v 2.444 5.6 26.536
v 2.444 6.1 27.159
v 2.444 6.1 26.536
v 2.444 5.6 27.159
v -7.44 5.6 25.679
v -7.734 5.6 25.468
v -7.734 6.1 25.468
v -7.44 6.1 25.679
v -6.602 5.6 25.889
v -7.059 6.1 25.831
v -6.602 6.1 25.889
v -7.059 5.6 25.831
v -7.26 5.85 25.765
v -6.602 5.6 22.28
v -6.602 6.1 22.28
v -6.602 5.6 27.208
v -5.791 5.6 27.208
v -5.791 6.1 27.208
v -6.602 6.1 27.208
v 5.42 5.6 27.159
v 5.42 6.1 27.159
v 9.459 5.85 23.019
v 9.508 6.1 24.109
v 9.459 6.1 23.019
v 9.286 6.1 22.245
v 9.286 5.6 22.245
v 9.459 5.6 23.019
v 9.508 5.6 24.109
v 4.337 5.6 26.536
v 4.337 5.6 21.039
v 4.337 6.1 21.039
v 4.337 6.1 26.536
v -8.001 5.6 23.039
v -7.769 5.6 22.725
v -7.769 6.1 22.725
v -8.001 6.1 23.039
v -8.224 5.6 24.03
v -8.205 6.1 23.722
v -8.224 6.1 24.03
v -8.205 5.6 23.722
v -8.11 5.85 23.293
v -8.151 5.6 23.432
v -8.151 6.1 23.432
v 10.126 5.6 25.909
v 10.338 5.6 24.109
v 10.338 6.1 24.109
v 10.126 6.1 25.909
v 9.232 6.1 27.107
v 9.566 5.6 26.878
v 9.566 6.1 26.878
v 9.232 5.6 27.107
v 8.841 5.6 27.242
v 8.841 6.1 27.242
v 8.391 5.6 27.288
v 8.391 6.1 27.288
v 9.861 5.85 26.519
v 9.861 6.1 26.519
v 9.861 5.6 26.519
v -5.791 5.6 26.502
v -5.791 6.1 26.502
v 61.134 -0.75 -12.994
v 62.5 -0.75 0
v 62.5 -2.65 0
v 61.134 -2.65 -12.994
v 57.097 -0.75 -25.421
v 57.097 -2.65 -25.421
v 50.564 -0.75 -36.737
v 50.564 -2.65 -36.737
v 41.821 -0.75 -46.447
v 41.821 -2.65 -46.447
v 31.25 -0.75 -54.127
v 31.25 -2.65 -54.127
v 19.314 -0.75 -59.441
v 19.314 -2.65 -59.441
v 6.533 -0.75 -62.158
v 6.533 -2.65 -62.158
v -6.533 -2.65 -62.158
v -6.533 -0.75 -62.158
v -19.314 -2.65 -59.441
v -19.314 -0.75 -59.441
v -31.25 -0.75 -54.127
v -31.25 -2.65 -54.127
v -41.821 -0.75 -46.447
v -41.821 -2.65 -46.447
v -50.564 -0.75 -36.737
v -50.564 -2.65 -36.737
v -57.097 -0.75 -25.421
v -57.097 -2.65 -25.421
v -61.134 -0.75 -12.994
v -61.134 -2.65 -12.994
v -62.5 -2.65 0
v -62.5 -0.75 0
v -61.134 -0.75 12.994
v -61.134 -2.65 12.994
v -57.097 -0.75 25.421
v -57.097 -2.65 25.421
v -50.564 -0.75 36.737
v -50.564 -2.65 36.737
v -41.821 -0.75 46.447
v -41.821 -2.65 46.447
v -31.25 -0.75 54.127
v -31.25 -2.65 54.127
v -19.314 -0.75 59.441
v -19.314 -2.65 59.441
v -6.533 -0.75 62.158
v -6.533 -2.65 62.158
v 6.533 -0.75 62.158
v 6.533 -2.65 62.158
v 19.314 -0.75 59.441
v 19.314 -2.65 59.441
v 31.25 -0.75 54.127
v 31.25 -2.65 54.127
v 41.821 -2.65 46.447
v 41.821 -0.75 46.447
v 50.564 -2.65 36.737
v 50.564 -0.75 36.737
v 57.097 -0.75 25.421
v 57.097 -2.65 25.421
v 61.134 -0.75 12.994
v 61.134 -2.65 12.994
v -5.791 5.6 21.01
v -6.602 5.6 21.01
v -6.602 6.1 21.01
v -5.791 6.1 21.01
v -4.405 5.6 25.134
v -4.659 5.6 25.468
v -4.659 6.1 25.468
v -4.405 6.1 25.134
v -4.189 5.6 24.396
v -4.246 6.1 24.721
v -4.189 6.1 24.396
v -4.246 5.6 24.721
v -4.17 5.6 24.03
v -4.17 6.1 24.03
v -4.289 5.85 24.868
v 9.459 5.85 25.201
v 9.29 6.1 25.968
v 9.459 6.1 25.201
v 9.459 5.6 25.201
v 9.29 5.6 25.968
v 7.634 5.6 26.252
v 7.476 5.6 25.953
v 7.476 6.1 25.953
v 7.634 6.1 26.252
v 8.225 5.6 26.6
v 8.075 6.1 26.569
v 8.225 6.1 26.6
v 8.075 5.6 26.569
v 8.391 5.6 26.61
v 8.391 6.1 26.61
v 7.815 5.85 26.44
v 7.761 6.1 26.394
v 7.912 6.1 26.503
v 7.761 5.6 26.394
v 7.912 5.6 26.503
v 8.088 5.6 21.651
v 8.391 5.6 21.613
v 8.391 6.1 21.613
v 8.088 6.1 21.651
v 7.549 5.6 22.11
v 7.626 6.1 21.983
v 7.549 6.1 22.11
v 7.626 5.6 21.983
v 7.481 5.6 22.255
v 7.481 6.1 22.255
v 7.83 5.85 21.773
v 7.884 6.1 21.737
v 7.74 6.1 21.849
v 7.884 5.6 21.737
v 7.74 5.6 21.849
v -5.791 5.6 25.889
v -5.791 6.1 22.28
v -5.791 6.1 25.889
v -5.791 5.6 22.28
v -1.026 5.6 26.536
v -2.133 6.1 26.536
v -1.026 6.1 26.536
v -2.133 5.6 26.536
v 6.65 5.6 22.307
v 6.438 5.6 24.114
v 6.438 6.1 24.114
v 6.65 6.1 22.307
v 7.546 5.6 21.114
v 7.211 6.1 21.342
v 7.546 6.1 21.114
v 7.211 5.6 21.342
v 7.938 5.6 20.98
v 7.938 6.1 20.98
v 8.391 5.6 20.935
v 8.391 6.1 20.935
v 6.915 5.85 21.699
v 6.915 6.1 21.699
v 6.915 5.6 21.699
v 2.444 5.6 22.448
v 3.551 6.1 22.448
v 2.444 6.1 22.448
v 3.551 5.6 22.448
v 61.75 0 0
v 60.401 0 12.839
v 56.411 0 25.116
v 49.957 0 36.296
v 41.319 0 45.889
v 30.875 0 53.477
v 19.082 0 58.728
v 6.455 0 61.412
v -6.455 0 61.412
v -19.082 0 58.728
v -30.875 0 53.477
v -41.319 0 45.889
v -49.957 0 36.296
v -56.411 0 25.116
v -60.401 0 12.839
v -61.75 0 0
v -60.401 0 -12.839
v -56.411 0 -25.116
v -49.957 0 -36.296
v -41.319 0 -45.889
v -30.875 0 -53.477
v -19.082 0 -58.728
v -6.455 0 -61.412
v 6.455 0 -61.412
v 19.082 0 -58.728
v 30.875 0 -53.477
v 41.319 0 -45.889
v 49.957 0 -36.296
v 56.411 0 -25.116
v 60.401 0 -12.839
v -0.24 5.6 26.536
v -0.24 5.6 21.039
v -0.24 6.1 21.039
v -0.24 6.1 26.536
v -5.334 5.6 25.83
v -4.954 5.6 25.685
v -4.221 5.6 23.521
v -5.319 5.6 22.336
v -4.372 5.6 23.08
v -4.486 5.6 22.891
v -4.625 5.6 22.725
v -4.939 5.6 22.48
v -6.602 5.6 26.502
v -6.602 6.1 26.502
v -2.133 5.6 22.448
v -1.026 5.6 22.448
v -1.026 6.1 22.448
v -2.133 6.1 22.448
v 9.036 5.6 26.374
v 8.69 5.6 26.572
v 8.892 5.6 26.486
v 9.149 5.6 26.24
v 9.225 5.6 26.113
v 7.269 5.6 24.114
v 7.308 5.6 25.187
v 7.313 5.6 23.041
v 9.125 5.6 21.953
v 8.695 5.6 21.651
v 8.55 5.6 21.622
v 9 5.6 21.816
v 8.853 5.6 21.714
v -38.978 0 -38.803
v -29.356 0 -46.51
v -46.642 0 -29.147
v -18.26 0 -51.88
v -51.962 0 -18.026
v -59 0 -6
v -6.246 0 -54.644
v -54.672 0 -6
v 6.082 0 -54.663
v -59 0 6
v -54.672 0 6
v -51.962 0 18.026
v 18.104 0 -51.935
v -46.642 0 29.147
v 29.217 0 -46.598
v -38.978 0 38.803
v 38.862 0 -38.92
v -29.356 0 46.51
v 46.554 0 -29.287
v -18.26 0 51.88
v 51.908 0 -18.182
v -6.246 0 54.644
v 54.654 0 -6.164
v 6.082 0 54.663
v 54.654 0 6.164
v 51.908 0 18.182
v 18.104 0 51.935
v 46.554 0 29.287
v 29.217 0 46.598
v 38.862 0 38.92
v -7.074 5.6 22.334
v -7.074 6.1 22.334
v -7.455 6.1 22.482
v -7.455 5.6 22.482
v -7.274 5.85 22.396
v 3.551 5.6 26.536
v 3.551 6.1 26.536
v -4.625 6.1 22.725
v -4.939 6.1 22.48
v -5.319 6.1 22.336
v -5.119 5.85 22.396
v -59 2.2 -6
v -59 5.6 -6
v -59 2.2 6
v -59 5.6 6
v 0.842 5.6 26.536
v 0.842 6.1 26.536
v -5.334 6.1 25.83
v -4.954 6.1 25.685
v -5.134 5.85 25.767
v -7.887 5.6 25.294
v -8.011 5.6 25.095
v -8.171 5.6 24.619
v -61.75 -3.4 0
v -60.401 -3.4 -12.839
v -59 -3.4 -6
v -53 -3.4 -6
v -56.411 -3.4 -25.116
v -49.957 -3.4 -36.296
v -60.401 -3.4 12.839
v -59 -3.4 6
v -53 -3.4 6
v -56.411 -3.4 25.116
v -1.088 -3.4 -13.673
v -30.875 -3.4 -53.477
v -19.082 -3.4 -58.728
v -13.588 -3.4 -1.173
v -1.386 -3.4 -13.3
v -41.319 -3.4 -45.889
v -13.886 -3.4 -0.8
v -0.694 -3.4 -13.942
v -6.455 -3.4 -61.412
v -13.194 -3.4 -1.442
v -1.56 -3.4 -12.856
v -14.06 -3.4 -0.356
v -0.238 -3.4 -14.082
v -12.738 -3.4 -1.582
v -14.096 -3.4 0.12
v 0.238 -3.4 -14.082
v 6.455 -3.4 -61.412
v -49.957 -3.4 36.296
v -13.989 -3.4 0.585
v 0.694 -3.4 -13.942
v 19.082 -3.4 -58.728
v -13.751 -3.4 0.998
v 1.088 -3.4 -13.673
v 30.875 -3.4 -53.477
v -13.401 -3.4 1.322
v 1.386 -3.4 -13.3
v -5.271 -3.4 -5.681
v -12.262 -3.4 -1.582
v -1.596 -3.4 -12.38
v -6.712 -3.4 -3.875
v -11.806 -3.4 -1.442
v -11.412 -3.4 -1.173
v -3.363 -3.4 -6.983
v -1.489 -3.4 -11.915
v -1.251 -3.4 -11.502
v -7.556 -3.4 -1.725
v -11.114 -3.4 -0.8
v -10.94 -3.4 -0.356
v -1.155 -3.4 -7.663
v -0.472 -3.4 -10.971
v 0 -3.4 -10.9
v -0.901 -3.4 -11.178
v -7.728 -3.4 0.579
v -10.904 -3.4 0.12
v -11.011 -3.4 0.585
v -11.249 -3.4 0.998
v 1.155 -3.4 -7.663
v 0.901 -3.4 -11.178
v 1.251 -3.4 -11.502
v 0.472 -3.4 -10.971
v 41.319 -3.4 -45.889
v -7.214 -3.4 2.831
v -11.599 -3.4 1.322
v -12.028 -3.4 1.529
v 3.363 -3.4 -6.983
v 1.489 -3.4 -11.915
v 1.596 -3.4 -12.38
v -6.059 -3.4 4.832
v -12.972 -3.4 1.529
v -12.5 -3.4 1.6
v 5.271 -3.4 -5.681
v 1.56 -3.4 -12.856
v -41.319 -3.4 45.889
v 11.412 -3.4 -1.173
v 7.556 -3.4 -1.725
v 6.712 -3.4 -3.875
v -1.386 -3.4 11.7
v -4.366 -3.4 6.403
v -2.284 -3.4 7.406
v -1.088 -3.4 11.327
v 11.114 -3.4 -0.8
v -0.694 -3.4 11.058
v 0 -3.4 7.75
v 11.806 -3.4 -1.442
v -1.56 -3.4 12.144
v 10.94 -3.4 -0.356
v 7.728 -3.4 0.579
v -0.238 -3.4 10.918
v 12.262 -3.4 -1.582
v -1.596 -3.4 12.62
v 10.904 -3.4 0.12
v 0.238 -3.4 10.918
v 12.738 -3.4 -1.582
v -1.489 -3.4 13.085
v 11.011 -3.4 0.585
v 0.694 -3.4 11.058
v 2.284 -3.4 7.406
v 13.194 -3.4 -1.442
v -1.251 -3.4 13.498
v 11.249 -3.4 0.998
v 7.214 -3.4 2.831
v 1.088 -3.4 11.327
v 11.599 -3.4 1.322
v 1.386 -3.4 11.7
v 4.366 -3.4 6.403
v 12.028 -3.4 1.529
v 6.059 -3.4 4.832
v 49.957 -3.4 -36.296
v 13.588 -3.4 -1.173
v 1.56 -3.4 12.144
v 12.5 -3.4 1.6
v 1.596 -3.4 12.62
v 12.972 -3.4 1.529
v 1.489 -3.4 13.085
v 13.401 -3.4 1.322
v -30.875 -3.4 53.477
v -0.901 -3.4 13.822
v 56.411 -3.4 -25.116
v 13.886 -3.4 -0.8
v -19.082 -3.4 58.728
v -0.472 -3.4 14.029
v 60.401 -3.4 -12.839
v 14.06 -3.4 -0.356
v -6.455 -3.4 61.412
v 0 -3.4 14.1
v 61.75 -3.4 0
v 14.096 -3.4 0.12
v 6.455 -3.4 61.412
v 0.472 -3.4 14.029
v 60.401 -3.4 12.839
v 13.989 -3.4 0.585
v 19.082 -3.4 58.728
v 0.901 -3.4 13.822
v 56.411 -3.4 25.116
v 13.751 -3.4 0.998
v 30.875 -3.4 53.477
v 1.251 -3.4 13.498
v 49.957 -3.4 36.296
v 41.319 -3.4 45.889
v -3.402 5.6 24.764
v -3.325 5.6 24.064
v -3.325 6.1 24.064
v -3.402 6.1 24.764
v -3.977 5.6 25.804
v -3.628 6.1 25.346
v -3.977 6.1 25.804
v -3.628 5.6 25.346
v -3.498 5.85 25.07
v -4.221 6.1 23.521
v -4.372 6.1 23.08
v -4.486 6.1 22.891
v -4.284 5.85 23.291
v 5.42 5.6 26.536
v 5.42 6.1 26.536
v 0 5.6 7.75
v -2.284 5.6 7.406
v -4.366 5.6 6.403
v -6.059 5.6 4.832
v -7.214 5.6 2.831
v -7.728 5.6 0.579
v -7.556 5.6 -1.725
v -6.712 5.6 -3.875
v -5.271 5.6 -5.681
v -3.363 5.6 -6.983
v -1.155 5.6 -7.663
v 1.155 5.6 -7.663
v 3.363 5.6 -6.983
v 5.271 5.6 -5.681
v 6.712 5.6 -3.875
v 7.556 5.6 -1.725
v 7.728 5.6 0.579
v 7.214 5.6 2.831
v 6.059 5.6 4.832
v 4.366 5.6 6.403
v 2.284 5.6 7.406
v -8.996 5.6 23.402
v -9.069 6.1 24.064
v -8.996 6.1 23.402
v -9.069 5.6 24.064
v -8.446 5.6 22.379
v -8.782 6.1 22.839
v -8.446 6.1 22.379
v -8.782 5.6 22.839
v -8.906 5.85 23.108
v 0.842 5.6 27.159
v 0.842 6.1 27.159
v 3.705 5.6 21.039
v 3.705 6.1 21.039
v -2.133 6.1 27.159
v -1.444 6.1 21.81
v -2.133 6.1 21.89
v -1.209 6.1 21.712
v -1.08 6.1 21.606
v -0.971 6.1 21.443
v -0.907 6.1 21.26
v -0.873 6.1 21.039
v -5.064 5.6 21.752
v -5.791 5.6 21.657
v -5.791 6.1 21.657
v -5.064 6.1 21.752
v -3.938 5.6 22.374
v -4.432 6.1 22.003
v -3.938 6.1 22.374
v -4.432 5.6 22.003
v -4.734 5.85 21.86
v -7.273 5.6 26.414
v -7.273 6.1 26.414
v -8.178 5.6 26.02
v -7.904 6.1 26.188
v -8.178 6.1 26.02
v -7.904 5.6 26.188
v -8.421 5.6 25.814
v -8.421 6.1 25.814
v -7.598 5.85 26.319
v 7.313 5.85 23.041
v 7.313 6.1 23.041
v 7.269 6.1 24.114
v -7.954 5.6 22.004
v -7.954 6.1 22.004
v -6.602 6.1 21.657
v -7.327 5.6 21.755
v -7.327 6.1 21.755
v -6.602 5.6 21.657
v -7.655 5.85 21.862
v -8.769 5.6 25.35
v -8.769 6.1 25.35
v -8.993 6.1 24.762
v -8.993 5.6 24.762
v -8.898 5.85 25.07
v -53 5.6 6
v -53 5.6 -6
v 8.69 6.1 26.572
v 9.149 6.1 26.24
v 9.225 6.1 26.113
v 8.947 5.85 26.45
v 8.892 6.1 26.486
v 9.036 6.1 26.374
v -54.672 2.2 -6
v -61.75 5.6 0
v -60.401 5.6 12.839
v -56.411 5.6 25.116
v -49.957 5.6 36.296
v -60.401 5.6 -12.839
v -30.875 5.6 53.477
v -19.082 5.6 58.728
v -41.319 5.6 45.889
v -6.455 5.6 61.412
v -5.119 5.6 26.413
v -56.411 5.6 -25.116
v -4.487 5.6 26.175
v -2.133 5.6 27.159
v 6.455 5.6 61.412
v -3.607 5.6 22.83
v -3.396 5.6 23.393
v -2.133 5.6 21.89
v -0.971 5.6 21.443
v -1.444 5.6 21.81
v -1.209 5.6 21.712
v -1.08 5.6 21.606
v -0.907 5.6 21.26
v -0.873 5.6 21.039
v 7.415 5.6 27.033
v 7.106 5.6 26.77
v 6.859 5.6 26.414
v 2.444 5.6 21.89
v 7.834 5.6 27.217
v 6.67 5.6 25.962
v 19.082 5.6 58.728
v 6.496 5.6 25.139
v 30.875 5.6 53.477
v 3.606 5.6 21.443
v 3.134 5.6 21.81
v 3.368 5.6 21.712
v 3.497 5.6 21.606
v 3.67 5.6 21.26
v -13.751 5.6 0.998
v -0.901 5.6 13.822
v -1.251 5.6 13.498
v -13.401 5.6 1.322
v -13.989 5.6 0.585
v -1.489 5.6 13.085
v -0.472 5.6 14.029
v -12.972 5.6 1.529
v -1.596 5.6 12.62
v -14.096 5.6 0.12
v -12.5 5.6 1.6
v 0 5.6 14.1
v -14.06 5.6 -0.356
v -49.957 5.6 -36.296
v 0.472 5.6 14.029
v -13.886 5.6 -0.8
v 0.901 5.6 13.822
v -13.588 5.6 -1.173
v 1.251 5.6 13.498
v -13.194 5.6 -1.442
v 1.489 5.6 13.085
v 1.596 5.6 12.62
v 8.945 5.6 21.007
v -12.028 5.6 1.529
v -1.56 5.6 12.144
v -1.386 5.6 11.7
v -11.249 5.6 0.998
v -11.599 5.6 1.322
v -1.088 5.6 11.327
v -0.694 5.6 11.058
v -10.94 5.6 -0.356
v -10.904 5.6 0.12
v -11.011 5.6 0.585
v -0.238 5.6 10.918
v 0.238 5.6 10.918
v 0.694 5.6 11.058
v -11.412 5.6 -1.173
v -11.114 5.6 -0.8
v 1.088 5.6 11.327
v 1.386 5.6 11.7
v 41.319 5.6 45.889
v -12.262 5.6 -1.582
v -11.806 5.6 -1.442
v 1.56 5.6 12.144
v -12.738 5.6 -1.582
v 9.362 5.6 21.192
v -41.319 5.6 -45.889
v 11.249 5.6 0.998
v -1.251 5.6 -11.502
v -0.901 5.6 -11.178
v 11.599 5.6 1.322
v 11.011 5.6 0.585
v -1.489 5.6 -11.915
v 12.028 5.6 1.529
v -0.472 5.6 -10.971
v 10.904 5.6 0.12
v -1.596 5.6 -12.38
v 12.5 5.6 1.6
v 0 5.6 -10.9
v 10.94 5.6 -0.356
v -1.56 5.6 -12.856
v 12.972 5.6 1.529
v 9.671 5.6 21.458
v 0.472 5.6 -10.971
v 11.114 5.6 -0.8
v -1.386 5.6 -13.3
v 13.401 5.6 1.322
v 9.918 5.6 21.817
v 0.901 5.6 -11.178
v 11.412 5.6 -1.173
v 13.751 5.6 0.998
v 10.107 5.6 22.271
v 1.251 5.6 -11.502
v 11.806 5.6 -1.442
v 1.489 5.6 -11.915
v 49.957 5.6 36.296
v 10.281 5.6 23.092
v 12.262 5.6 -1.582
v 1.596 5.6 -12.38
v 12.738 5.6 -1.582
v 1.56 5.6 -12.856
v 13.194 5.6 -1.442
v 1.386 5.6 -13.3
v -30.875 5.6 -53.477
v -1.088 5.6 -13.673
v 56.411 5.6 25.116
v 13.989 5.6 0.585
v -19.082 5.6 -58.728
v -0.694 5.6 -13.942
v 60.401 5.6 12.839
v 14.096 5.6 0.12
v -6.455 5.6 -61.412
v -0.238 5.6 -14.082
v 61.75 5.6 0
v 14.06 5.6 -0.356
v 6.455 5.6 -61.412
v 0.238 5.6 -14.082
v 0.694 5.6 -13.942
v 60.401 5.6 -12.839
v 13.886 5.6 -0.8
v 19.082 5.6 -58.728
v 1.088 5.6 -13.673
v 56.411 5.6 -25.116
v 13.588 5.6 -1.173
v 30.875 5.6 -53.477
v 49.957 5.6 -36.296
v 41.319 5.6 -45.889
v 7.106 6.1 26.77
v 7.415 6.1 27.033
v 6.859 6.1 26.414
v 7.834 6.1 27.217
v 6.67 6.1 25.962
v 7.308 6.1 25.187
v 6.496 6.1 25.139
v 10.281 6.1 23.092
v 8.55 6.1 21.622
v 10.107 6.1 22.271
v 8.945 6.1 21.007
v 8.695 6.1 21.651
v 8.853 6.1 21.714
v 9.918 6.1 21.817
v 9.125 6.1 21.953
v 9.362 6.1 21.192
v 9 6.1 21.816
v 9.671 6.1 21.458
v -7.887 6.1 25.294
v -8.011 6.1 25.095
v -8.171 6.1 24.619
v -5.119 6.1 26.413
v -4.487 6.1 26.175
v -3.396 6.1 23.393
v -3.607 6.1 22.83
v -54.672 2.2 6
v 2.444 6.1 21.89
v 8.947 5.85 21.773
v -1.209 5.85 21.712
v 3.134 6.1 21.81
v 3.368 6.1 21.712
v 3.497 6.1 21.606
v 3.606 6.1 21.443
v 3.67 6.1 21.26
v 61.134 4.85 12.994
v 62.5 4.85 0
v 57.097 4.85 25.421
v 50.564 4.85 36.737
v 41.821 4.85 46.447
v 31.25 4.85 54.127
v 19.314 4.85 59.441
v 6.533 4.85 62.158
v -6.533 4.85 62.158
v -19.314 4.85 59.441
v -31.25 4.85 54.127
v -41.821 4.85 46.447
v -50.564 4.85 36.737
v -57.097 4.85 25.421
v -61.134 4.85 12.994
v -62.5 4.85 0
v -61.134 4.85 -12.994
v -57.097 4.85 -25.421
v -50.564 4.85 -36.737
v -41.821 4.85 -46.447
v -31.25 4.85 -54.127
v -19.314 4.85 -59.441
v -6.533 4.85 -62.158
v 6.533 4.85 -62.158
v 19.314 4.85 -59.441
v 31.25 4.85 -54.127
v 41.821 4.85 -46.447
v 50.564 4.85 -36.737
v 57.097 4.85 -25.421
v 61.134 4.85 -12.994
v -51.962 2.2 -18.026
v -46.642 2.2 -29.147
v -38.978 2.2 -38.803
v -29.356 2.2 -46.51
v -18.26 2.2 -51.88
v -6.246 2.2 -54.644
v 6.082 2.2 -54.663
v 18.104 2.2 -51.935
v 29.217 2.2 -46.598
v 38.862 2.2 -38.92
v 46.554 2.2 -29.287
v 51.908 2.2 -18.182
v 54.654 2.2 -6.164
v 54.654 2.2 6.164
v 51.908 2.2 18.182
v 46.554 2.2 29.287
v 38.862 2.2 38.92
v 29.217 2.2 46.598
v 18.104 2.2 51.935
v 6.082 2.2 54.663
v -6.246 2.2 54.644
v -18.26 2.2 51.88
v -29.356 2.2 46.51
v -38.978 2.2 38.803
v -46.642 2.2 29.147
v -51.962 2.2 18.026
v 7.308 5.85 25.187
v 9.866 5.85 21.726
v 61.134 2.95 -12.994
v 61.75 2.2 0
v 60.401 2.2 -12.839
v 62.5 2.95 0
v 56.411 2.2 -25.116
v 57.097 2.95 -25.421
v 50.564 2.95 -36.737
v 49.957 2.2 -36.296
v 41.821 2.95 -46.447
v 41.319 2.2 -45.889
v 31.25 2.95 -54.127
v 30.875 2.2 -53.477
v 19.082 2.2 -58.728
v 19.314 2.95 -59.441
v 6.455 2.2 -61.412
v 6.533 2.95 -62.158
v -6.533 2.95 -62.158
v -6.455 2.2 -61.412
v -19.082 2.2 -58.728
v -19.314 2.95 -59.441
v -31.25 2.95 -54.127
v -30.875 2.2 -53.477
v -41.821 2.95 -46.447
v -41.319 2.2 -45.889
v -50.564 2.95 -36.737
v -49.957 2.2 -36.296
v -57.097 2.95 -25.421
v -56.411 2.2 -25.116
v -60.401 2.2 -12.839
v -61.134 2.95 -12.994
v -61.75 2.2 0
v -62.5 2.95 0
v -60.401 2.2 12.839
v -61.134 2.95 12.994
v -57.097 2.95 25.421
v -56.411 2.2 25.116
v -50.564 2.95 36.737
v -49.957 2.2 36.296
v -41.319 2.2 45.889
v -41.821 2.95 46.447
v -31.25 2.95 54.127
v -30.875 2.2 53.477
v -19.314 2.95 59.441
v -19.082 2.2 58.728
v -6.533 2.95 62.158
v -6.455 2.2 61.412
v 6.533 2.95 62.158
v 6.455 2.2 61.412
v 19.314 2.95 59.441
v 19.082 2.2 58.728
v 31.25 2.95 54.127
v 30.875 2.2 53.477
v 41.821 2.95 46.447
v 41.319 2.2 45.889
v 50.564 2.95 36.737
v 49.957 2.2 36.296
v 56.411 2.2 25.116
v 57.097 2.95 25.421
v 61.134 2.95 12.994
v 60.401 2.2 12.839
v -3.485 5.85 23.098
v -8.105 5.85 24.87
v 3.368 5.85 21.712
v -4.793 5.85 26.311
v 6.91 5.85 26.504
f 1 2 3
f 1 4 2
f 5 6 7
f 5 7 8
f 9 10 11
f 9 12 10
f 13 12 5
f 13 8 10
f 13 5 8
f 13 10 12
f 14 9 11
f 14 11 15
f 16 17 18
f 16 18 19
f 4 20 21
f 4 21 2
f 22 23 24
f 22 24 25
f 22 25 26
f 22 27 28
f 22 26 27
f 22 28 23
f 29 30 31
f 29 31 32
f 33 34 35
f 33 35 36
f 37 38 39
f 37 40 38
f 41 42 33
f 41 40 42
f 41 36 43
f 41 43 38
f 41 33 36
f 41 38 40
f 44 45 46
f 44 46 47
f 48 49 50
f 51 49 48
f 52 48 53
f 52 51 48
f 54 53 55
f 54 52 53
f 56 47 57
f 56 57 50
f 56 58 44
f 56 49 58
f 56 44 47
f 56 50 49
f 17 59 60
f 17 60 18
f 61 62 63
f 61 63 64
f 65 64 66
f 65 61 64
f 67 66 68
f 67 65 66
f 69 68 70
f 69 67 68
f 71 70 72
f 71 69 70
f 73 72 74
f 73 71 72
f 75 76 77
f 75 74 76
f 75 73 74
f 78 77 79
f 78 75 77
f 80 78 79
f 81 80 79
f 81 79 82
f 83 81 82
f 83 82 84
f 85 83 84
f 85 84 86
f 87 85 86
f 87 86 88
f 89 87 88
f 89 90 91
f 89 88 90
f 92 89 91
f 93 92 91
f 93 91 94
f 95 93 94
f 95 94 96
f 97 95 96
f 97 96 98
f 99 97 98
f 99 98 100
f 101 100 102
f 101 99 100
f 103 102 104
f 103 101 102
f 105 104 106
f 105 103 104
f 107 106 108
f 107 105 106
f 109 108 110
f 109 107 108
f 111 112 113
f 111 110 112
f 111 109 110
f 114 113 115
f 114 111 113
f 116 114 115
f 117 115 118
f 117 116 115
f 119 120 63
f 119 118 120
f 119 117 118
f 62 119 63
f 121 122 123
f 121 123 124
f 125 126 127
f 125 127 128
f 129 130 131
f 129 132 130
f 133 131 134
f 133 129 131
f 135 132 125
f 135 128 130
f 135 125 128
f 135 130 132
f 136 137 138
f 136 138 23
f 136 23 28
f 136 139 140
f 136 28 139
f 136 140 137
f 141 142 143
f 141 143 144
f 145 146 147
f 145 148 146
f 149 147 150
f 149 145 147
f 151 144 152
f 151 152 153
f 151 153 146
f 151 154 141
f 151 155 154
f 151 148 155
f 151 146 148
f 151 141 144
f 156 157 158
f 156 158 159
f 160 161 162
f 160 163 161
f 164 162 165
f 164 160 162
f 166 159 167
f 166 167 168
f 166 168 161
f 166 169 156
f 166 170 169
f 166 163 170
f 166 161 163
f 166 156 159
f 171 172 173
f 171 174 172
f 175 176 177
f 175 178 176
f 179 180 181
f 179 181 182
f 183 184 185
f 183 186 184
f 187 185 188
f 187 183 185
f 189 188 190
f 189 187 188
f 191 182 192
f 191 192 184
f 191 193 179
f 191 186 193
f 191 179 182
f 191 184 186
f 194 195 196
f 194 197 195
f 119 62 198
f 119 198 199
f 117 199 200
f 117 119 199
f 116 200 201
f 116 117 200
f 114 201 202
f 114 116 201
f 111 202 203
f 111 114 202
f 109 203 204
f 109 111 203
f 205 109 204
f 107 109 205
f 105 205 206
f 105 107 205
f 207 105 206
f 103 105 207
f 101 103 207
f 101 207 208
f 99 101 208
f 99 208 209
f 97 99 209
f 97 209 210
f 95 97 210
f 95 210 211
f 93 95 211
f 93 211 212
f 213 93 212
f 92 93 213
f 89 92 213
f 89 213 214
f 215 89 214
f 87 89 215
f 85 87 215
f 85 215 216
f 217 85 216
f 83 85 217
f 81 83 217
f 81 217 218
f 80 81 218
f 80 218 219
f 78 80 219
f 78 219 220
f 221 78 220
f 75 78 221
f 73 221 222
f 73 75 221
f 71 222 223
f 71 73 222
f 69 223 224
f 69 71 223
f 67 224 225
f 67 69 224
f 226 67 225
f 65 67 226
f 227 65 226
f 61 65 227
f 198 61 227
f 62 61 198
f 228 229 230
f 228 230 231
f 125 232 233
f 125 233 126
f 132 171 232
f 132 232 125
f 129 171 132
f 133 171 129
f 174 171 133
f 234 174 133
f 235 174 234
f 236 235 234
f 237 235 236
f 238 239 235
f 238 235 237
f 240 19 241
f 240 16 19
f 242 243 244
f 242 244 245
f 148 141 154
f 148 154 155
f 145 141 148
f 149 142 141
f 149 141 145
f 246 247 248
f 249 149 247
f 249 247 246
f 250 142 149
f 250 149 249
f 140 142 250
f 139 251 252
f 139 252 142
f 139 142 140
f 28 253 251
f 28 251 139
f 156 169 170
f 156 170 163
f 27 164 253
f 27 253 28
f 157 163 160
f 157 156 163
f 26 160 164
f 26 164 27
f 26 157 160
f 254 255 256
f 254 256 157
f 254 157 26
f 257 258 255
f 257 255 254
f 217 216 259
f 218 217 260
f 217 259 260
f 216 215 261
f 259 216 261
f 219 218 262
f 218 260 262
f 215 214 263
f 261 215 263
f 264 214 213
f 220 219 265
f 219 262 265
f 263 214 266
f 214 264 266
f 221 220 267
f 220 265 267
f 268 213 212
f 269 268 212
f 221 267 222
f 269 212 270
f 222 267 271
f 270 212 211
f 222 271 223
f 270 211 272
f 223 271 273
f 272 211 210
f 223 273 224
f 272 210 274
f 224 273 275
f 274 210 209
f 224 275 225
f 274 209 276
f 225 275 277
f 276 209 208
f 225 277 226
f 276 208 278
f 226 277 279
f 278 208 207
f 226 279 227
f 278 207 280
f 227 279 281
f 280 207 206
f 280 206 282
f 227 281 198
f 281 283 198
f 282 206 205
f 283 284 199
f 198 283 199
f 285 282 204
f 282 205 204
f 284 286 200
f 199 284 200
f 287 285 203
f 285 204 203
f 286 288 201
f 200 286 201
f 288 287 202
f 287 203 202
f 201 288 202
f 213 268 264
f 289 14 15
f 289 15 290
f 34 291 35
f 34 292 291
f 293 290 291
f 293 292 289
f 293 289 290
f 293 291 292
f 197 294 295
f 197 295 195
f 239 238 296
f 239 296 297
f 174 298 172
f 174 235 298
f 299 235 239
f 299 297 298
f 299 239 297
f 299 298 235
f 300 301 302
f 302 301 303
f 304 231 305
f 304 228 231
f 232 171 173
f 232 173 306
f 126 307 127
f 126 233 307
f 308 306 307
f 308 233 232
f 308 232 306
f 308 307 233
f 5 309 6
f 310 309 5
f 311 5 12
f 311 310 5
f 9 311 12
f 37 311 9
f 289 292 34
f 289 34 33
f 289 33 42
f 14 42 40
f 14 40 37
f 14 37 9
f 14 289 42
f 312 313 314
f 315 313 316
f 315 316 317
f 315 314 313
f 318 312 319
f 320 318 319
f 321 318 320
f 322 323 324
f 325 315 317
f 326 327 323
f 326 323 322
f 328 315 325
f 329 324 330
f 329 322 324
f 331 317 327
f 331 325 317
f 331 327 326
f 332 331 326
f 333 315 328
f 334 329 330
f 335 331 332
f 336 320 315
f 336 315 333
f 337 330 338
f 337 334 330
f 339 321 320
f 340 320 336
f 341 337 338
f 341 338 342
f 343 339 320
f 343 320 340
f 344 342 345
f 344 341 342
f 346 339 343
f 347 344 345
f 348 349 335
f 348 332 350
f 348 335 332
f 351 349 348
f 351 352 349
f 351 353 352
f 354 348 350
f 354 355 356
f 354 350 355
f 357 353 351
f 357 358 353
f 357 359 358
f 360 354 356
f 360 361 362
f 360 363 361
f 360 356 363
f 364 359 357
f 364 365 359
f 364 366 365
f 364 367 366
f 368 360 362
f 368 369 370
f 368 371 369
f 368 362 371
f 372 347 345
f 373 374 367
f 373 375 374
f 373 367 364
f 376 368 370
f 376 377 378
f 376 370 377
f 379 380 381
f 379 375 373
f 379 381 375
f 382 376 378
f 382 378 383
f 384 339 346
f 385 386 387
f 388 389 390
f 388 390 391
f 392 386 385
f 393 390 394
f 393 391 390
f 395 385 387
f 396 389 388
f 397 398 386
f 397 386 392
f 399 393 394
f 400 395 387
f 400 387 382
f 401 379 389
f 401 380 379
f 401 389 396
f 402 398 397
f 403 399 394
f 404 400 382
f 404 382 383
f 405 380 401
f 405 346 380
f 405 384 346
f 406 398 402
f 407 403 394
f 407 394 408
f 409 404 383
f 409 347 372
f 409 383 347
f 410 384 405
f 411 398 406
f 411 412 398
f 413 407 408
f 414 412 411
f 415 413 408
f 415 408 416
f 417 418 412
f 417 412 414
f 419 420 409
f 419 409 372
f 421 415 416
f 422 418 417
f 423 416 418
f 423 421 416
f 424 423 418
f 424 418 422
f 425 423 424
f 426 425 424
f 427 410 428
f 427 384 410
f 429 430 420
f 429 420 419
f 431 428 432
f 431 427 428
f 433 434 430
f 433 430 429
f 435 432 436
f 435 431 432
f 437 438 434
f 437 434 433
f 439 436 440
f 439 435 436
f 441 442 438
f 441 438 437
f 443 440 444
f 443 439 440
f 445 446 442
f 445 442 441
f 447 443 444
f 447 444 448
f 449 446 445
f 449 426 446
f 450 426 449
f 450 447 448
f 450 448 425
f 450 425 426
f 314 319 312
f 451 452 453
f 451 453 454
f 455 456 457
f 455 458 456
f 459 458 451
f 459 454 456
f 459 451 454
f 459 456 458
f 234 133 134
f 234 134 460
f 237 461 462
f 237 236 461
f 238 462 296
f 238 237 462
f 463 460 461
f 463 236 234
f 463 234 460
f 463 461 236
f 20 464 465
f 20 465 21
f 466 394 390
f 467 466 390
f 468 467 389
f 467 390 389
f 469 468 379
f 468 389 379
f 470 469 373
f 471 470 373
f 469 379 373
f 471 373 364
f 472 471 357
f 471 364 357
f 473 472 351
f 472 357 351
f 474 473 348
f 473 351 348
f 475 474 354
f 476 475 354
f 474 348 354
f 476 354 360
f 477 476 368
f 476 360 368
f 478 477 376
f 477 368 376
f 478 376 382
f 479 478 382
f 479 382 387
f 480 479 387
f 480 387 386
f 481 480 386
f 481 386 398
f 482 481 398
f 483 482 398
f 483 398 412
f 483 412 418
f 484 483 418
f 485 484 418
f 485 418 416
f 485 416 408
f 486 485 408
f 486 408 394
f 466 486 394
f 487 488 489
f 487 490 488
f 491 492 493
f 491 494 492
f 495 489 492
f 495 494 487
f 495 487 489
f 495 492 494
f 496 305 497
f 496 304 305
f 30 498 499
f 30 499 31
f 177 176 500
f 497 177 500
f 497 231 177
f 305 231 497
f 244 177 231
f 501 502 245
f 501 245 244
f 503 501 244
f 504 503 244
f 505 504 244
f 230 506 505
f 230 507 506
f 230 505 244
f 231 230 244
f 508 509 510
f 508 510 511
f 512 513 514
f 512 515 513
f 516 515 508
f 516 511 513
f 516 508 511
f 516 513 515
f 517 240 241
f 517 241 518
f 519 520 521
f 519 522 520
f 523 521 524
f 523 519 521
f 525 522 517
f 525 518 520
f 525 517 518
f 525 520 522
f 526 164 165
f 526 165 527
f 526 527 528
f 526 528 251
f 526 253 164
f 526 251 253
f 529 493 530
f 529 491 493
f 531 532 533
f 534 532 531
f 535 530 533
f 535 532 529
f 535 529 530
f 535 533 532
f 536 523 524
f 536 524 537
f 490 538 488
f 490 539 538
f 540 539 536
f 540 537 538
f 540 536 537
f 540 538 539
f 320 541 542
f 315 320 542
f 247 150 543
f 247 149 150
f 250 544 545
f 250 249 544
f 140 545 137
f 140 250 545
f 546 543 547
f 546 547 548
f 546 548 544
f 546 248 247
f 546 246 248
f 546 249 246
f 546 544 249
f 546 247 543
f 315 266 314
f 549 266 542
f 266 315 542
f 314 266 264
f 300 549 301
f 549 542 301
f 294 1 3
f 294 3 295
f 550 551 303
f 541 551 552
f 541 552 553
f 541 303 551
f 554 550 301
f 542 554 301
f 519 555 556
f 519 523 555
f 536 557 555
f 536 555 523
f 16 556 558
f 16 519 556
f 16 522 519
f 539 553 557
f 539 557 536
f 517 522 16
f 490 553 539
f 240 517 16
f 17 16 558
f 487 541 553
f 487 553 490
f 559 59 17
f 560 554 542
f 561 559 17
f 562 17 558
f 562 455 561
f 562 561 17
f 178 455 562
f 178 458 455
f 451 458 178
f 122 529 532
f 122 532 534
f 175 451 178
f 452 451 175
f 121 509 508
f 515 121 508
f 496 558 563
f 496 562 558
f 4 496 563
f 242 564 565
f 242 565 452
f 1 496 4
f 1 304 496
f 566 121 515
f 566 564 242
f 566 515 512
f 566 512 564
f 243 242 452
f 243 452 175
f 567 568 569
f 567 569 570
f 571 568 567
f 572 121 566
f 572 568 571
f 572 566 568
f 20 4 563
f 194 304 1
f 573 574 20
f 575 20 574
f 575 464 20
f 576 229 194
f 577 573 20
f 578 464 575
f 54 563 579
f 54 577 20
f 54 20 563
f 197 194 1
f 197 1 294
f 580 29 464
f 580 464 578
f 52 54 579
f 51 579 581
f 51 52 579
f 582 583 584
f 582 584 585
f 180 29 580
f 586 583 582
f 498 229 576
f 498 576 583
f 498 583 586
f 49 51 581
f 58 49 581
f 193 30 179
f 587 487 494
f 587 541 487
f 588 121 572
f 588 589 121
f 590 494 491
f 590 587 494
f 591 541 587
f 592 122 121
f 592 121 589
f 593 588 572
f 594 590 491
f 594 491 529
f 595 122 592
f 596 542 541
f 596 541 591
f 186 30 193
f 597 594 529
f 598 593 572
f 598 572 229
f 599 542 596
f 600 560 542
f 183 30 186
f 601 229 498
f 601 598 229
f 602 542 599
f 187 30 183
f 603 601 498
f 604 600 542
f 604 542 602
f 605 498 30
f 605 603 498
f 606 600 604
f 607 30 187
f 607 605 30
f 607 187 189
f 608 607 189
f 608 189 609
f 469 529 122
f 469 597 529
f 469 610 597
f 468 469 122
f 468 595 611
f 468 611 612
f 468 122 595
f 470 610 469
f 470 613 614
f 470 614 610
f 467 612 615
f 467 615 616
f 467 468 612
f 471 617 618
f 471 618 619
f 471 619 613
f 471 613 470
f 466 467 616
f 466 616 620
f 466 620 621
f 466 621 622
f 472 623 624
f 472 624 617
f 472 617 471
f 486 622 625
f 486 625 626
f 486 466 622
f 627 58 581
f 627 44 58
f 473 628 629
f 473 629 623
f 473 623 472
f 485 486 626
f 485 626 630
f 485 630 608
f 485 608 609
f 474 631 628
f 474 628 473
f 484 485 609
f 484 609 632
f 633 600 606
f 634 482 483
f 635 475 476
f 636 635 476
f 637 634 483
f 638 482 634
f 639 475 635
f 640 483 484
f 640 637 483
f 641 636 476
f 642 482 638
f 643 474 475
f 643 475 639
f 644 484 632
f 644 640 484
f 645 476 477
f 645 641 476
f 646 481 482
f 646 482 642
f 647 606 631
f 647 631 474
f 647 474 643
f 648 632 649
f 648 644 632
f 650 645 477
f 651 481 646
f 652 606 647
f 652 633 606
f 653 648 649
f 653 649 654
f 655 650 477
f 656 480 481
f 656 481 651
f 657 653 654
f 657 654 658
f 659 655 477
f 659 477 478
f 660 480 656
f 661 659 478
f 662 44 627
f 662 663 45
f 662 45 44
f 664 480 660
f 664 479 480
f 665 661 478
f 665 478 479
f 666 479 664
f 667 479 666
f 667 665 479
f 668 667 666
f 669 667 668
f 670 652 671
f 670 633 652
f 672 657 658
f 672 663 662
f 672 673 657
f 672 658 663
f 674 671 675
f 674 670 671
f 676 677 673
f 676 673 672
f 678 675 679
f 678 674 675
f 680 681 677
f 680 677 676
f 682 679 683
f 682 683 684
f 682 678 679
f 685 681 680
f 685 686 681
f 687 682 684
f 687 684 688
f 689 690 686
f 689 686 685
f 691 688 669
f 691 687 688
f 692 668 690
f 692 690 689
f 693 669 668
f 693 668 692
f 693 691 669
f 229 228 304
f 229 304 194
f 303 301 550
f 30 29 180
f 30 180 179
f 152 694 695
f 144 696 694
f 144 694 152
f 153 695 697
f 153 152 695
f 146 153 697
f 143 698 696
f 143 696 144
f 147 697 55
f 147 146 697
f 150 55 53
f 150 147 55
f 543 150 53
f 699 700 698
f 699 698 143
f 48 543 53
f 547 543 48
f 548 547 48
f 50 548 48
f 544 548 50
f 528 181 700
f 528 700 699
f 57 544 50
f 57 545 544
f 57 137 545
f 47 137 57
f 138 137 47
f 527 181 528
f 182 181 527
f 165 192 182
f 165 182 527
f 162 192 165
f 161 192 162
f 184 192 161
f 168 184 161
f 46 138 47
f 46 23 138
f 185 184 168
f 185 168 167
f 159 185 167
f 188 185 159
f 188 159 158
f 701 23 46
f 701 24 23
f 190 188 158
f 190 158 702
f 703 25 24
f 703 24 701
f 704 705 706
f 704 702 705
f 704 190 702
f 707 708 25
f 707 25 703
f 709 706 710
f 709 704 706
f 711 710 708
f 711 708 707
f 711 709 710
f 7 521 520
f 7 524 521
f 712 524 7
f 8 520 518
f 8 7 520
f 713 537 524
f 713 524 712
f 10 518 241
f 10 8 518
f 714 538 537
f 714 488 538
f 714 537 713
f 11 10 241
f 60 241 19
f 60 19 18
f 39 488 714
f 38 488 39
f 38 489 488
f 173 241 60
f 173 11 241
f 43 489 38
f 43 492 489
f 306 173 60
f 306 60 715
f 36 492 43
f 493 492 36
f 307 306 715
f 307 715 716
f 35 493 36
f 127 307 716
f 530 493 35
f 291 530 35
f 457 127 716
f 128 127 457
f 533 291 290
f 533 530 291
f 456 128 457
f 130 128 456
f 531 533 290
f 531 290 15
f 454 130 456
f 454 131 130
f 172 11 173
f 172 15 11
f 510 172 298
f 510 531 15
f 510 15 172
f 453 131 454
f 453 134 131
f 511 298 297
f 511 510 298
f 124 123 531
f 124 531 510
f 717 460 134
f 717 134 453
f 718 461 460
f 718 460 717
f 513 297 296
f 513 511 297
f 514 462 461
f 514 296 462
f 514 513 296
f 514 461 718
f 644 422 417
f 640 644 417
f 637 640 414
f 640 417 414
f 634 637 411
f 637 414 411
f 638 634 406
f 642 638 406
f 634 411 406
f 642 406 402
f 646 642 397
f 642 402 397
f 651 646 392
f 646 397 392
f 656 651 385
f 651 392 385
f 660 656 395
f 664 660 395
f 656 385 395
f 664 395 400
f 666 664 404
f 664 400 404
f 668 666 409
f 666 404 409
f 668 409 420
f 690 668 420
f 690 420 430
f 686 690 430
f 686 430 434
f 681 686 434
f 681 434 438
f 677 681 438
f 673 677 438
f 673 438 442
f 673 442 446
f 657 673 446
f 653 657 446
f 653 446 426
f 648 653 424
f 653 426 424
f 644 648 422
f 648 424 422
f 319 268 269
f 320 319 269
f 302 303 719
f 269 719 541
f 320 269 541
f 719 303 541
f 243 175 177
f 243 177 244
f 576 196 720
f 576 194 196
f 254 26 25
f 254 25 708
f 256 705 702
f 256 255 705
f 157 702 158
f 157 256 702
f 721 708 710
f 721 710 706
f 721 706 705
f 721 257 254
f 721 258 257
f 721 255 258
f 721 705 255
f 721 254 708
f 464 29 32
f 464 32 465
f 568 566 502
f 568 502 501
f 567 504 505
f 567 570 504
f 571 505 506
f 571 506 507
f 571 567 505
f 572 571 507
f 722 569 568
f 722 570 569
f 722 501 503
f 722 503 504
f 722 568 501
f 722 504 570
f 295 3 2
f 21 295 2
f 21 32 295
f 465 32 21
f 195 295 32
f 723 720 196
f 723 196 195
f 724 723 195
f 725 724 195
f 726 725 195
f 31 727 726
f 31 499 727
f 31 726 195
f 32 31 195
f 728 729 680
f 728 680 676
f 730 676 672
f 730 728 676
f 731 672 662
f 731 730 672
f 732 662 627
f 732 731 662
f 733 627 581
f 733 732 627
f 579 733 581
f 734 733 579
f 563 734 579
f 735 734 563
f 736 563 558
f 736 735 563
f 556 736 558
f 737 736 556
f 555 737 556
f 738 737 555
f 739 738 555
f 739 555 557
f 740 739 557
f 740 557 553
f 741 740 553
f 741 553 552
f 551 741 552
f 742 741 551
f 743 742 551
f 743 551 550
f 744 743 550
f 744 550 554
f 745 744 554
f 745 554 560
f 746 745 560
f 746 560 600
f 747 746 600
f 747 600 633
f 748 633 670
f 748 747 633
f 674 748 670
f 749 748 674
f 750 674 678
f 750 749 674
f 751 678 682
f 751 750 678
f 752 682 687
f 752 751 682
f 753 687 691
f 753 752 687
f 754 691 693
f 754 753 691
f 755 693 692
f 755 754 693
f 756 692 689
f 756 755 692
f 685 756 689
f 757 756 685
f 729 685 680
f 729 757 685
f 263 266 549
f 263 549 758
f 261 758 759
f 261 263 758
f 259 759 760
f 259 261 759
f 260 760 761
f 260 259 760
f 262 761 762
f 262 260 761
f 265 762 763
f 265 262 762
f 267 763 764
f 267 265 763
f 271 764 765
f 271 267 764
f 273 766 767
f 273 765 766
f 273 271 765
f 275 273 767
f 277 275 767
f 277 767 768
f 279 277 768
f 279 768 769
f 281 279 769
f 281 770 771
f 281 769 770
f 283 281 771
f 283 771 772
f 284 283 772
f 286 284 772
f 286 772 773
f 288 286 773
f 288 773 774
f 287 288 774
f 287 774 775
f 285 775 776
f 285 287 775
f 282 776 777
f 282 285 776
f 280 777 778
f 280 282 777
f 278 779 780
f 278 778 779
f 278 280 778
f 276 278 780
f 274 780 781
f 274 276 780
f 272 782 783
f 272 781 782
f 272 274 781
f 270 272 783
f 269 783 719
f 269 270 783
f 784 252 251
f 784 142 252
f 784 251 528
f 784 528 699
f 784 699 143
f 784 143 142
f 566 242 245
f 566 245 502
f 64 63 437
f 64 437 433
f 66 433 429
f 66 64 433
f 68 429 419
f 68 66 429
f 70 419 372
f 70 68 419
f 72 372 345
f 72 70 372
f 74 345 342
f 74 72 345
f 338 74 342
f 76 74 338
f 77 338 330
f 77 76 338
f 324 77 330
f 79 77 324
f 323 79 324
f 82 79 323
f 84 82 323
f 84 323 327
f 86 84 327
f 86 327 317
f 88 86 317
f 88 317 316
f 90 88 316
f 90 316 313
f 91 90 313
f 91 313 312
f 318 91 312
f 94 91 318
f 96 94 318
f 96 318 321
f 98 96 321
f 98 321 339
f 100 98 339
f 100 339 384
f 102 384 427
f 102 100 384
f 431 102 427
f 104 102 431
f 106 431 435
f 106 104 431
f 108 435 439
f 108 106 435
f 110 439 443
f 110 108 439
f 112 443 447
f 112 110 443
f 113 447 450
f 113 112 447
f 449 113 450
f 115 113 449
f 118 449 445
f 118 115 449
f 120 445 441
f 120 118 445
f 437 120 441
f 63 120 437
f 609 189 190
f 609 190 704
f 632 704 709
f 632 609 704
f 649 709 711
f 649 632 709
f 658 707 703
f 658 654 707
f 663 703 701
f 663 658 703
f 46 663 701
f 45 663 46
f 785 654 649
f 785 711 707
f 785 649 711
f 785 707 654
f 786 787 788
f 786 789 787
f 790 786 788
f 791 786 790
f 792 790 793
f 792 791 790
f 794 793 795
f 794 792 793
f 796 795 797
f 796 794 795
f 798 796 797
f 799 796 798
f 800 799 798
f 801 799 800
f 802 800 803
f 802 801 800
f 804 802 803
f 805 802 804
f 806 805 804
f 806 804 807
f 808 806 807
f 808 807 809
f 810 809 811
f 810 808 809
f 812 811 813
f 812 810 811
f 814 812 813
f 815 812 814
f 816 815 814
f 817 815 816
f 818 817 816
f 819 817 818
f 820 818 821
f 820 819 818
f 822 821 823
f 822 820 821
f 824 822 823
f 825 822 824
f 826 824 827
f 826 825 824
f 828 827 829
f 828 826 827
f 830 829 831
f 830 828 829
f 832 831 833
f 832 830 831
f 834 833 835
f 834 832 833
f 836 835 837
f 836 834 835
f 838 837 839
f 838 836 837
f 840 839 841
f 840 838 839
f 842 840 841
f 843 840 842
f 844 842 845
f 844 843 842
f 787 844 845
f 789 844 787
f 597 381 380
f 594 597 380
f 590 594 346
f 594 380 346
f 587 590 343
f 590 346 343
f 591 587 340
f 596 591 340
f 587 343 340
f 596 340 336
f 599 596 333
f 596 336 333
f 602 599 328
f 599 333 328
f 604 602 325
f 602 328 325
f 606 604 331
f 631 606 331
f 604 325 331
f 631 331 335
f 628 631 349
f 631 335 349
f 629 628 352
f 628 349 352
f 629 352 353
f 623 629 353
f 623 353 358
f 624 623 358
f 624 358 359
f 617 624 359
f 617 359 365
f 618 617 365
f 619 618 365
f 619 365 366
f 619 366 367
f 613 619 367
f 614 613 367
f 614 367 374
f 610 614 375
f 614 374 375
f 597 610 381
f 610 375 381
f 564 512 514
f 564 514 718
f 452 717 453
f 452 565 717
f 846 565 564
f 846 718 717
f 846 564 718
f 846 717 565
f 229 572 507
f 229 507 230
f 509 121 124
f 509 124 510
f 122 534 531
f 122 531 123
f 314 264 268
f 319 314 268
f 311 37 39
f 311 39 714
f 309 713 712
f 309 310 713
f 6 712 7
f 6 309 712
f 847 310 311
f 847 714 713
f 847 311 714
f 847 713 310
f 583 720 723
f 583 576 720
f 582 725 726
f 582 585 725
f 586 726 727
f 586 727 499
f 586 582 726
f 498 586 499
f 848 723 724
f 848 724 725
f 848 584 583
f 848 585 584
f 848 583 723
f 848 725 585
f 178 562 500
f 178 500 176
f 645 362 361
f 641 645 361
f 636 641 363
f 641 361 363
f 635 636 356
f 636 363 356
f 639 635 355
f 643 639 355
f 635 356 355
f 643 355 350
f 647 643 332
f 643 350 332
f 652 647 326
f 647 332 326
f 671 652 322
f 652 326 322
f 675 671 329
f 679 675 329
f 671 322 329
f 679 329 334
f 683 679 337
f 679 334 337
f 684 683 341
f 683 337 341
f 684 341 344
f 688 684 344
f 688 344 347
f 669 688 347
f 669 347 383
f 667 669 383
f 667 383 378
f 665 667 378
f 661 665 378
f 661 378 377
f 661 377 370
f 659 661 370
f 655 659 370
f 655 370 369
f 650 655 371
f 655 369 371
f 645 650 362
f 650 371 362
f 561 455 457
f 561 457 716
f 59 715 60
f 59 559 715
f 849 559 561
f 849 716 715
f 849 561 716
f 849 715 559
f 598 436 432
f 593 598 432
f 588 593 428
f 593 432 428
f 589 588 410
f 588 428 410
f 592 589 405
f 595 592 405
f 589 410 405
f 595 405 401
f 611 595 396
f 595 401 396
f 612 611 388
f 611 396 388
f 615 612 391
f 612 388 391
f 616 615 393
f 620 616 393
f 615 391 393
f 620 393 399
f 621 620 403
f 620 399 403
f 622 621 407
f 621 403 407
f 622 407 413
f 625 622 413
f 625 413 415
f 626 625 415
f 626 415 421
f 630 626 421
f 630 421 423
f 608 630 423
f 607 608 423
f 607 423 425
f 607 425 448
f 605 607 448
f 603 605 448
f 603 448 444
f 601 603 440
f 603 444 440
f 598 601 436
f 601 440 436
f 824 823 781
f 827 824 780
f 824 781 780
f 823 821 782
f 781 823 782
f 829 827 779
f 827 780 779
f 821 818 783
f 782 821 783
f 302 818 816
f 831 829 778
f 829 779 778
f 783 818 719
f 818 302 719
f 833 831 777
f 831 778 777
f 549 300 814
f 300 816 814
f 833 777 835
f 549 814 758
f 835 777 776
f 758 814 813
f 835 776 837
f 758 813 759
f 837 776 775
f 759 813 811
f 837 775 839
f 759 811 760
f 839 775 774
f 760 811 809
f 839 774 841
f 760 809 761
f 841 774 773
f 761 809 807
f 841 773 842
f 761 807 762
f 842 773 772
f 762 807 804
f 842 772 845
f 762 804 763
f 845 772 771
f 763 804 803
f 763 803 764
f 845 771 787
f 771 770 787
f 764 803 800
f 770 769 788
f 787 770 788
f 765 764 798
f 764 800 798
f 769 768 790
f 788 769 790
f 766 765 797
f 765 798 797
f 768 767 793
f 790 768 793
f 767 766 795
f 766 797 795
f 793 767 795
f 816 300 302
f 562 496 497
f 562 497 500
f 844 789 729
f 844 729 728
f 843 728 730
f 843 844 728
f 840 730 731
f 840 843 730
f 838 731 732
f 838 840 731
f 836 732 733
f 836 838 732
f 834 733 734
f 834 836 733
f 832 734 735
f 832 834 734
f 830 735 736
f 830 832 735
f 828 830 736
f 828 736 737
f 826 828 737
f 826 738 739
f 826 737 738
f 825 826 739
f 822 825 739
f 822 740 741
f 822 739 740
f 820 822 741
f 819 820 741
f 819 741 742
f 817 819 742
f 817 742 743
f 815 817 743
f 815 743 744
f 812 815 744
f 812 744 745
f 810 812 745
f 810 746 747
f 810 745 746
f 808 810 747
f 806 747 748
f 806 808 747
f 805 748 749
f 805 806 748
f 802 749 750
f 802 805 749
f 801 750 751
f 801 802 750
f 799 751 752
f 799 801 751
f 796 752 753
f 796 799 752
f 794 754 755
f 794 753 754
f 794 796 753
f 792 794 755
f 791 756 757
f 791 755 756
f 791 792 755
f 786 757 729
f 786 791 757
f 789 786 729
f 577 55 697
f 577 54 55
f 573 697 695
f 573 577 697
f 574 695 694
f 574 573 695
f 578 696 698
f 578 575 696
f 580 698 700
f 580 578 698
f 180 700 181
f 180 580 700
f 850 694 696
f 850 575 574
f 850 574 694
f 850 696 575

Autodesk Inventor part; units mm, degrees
ref_plane "YZ Plane" through (0, 0, 0) normal (1, 0, 0) x (0, 1, 0)
ref_plane "XZ Plane" through (0, 0, 0) normal (0, 1, 0) x (-1, 0, 0)
ref_plane "XY Plane" through (0, 0, 0) normal (0, 0, 1) x (1, 0, 0)
sketch "スケッチ1" plane through (0, 0, 0) normal (0, 1, 0) x (-1, 0, 0)
  circle A0 centre (0, 0) radius 55
  dimension "d0" = 110
extrude "押し出し1" add sketch "スケッチ1" along normal blind 2.2
sketch "スケッチ2" plane through (0, 2.2, 0) normal (0, 1, 0) x (1, 0, 0)
  circle A0 centre (0, 0) radius 62.5
  line L0 (-4.8484, -32.3614) -> (6.4919, -32.3614) construction
  line L1 (6.4919, -32.3614) -> (6.4919, -37.029) construction
  line L2 (6.4919, -37.029) -> (-4.8484, -37.029) construction
  line L3 (-4.8484, -37.029) -> (-4.8484, -32.3614) construction
  dimension "d3" = 125
extrude "押し出し2" add sketch "スケッチ2" along normal blind 3.4
chamfer "面取り1" distance 0.75 angle 45 1 edges at (-62.5, 2.2, 0)
chamfer "面取り2" distance 0.75 angle 45 1 edges at (-62.5, 5.6, 0)
sketch "スケッチ3" plane through (0, 0, 0) normal (0, -1, 0) x (1, 0, 0)
  circle A0 centre (0, 0) radius 62.5
  dimension "d12" = 125
extrude "押し出し3" add sketch "スケッチ3" along normal blind 3.4
chamfer "面取り3" distance 0.75 angle 45 1 edges at (-62.5, 0, 0)
chamfer "面取り4" distance 0.75 angle 45 1 edges at (-62.5, -3.4, 0)
sketch "スケッチ6" plane through (0, 5.6, 0) normal (0, 1, 0) x (1, 0, 0)
  circle A0 centre (0, 0) radius 7.65
  line L0 (0, 7.65) -> (46.8799, 7.65)
  circle A1 centre (0, 0) radius 47.5 projected
  line L1 (0, -7.65) -> (46.8799, -7.65)
  dimension "d39" = 15.3
extrude "押し出し5" [suppressed]
chamfer "面取り7" [suppressed]
chamfer "面取り8" [suppressed]
chamfer "面取り9" [suppressed]
sketch "スケッチ7" plane through (0, 5.6, 0) normal (0, 1, 0) x (1, 0, 0)
  line L0 (-9.3358, -20.9354) -> (21.308, -20.9354) construction
  line L1 (21.308, -20.9354) -> (21.308, -27.5341) construction
  line L2 (21.308, -27.5341) -> (-9.3358, -27.5341) construction
  line L3 (-9.3358, -27.5341) -> (-9.3358, -20.9354) construction
  spline S0 degree 2 poles (-5.7914, -21.6571) (-5.2131, -21.667) (-4.2541, -22.0526) (-3.9377, -22.3739) knots 0 0 0 1 2 2 2
  spline S1 degree 2 poles (-3.9377, -22.3739) (-3.646, -22.6754) (-3.3247, -23.5207) (-3.3247, -24.0645) knots 0 0 0 1 2 2 2
  spline S2 degree 2 poles (-3.3247, -24.0645) (-3.3247, -24.633) (-3.6708, -25.5079) (-3.9772, -25.8045) knots 0 0 0 1 2 2 2
  spline S3 degree 2 poles (-3.9772, -25.8045) (-4.3084, -26.1308) (-5.2773, -26.4916) (-5.7914, -26.5015) knots 0 0 0 1 2 2 2
  line L4 (-5.7914, -26.5015) -> (-5.7914, -27.2084)
  line L5 (-5.7914, -27.2084) -> (-6.6021, -27.2084)
  line L6 (-6.6021, -27.2084) -> (-6.6021, -26.5015)
  spline S4 degree 2 poles (-6.6021, -26.5015) (-7.1162, -26.4867) (-8.0802, -26.1506) (-8.4213, -25.8144) knots 0 0 0 1 2 2 2
  spline S5 degree 2 poles (-8.4213, -25.8144) (-8.7277, -25.5129) (-9.0688, -24.628) (-9.0688, -24.0645) knots 0 0 0 1 2 2 2
  spline S6 degree 2 poles (-9.0688, -24.0645) (-9.0688, -23.5306) (-8.7426, -22.6853) (-8.446, -22.3788) knots 0 0 0 1 2 2 2
  spline S7 degree 2 poles (-8.446, -22.3788) (-8.1296, -22.0526) (-7.1805, -21.672) (-6.6021, -21.6571) knots 0 0 0 1 2 2 2
  line L7 (-6.6021, -21.6571) -> (-6.6021, -21.0096)
  line L8 (-6.6021, -21.0096) -> (-5.7914, -21.0096)
  line L9 (-5.7914, -21.0096) -> (-5.7914, -21.6571)
  spline S8 degree 2 poles (-5.7914, -25.8886) (-5.4207, -25.8787) (-4.8473, -25.6562) (-4.6594, -25.4684) knots 0 0 0 1 2 2 2
  spline S9 degree 2 poles (-4.6594, -25.4684) (-4.4073, -25.2212) (-4.17, -24.5143) (-4.17, -24.0299) knots 0 0 0 1 2 2 2
  spline S10 degree 2 poles (-4.17, -24.0299) (-4.17, -23.6245) (-4.3974, -22.9572) (-4.6248, -22.7249) knots 0 0 0 1 2 2 2
  spline S11 degree 2 poles (-4.6248, -22.7249) (-4.8374, -22.5024) (-5.4009, -22.2899) (-5.7914, -22.28) knots 0 0 0 1 2 2 2
  line L10 (-5.7914, -22.28) -> (-5.7914, -25.8886)
  spline S12 degree 2 poles (-6.6021, -22.28) (-6.9926, -22.2849) (-7.5562, -22.5074) (-7.7687, -22.7249) knots 0 0 0 1 2 2 2
  spline S13 degree 2 poles (-7.7687, -22.7249) (-7.9961, -22.9523) (-8.2235, -23.6344) (-8.2235, -24.0299) knots 0 0 0 1 2 2 2
  spline S14 degree 2 poles (-8.2235, -24.0299) (-8.2235, -24.5143) (-7.9862, -25.2262) (-7.7341, -25.4684) knots 0 0 0 1 2 2 2
  spline S15 degree 2 poles (-7.7341, -25.4684) (-7.5463, -25.6463) (-6.9729, -25.8836) (-6.6021, -25.8886) knots 0 0 0 1 2 2 2
  line L11 (-6.6021, -25.8886) -> (-6.6021, -22.28)
  line L12 (0.8424, -27.159) -> (-2.1334, -27.159)
  line L13 (-2.1334, -27.159) -> (-2.1334, -26.5361)
  line L14 (-2.1334, -26.5361) -> (-1.0261, -26.5361)
  line L15 (-1.0261, -26.5361) -> (-1.0261, -22.448)
  line L16 (-1.0261, -22.448) -> (-2.1334, -22.448)
  line L17 (-2.1334, -22.448) -> (-2.1334, -21.8895)
  spline S16 degree 2 poles (-2.1334, -21.8895) (-1.5056, -21.8895) (-0.9124, -21.5335) (-0.8729, -21.0392) knots 0 0 0 1 2 2 2
  line L18 (-0.8729, -21.0392) -> (-0.2401, -21.0392)
  line L19 (-0.2401, -21.0392) -> (-0.2401, -26.5361)
  line L20 (-0.2401, -26.5361) -> (0.8424, -26.5361)
  line L21 (0.8424, -26.5361) -> (0.8424, -27.159)
  line L22 (5.4199, -27.159) -> (2.4441, -27.159)
  line L23 (2.4441, -27.159) -> (2.4441, -26.5361)
  line L24 (2.4441, -26.5361) -> (3.5514, -26.5361)
  line L25 (3.5514, -26.5361) -> (3.5514, -22.448)
  line L26 (3.5514, -22.448) -> (2.4441, -22.448)
  line L27 (2.4441, -22.448) -> (2.4441, -21.8895)
  spline S17 degree 2 poles (2.4441, -21.8895) (3.0719, -21.8895) (3.6651, -21.5335) (3.7046, -21.0392) knots 0 0 0 1 2 2 2
  line L28 (3.7046, -21.0392) -> (4.3373, -21.0392)
  line L29 (4.3373, -21.0392) -> (4.3373, -26.5361)
  line L30 (4.3373, -26.5361) -> (5.4199, -26.5361)
  line L31 (5.4199, -26.5361) -> (5.4199, -27.159)
  spline S18 degree 2 poles (10.3385, -24.109) (10.3385, -25.7502) (9.3844, -27.2875) (8.3908, -27.2875) knots 0 0 0 1 2 2 2
  spline S19 degree 2 poles (8.3908, -27.2875) (7.3824, -27.2875) (6.4382, -25.7205) (6.4382, -24.1139) knots 0 0 0 1 2 2 2
  spline S20 degree 2 poles (6.4382, -24.1139) (6.4382, -22.4629) (7.3923, -20.9354) (8.3908, -20.9354) knots 0 0 0 1 2 2 2
  spline S21 degree 2 poles (8.3908, -20.9354) (9.3943, -20.9354) (10.3385, -22.5173) (10.3385, -24.109) knots 0 0 0 1 2 2 2
  spline S22 degree 2 poles (9.2905, -25.9677) (9.4091, -25.6661) (9.508, -24.7368) (9.508, -24.109) knots 0 0 0 1 2 2 2
  spline S23 degree 2 poles (9.508, -24.109) (9.508, -23.4812) (9.4091, -22.5568) (9.2856, -22.2454) knots 0 0 0 1 2 2 2
  spline S24 degree 2 poles (9.2856, -22.2454) (9.162, -21.9339) (8.7319, -21.6126) (8.3908, -21.6126) knots 0 0 0 1 2 2 2
  spline S25 degree 2 poles (8.3908, -21.6126) (8.0497, -21.6126) (7.6098, -21.9339) (7.4813, -22.2553) knots 0 0 0 1 2 2 2
  spline S26 degree 2 poles (7.4813, -22.2553) (7.3577, -22.5667) (7.2687, -23.5158) (7.2687, -24.1139) knots 0 0 0 1 2 2 2
  spline S27 degree 2 poles (7.2687, -24.1139) (7.2687, -24.7566) (7.3478, -25.6167) (7.4763, -25.9528) knots 0 0 0 1 2 2 2
  spline S28 degree 2 poles (7.4763, -25.9528) (7.595, -26.2692) (8.0349, -26.6103) (8.3908, -26.6103) knots 0 0 0 1 2 2 2
  spline S29 degree 2 poles (8.3908, -26.6103) (8.727, -26.6103) (9.1669, -26.289) (9.2905, -25.9677) knots 0 0 0 1 2 2 2
  point P0 (0, 0)
extrude "押し出し6" add sketch "スケッチ7" along normal blind 0.5
sketch "スケッチ8" plane through (0, 5.6, 0) normal (0, 1, 0) x (1, 0, 0)
  line L0 (-53, 6) -> (-59, 6)
  line L1 (-59, 6) -> (-59, -6)
  line L2 (-59, -6) -> (-53, -6)
  line L3 (-53, -6) -> (-53, 6)
  circle A0 centre (0, 0) radius 55 projected
  point P0 (-56, -6)
  point P1 (-56, 6)
  point P2 (-55, 0)
  point P3 (-55, 0)
  dimension "d53" = 12
  dimension "d54" = 6
  dimension "d55" = 53
extrude "押し出し7" cut sketch "スケッチ8" against normal blind 10 contours L3 L2 A0 L0 | A0 L2 L1 L0 picked at (-53.6545, -0.6678)
sketch "スケッチ9" plane through (0, 5.6, 0) normal (0, 1, 0) x (1, 0, 0)
  point P0 (0, 0)
  point P1 (0, 0)
hole "穴2" at (0, 5.6, 0) direction (0, -1, 0) diameter 15.5 end through all
sketch "スケッチ10" plane through (0, 5.6, 0) normal (0, 1, 0) x (1, 0, 0)
  circle A0 centre (0, 0) radius 12.5 construction
  point P0 (0, -12.5)
  point P1 (12.5, 0)
  point P2 (0, 12.5)
  point P3 (-12.5, 0)
  dimension "d67" = 25
  dimension "d81" = 360
hole "穴3" at (0, 5.6, 12.5) at (-12.5, 5.6, 0) at (0, 5.6, -12.5) at (12.5, 5.6, 0) direction (0, -1, 0) diameter 3.2 end through all
properties part number "pully_shoulder2_110"
